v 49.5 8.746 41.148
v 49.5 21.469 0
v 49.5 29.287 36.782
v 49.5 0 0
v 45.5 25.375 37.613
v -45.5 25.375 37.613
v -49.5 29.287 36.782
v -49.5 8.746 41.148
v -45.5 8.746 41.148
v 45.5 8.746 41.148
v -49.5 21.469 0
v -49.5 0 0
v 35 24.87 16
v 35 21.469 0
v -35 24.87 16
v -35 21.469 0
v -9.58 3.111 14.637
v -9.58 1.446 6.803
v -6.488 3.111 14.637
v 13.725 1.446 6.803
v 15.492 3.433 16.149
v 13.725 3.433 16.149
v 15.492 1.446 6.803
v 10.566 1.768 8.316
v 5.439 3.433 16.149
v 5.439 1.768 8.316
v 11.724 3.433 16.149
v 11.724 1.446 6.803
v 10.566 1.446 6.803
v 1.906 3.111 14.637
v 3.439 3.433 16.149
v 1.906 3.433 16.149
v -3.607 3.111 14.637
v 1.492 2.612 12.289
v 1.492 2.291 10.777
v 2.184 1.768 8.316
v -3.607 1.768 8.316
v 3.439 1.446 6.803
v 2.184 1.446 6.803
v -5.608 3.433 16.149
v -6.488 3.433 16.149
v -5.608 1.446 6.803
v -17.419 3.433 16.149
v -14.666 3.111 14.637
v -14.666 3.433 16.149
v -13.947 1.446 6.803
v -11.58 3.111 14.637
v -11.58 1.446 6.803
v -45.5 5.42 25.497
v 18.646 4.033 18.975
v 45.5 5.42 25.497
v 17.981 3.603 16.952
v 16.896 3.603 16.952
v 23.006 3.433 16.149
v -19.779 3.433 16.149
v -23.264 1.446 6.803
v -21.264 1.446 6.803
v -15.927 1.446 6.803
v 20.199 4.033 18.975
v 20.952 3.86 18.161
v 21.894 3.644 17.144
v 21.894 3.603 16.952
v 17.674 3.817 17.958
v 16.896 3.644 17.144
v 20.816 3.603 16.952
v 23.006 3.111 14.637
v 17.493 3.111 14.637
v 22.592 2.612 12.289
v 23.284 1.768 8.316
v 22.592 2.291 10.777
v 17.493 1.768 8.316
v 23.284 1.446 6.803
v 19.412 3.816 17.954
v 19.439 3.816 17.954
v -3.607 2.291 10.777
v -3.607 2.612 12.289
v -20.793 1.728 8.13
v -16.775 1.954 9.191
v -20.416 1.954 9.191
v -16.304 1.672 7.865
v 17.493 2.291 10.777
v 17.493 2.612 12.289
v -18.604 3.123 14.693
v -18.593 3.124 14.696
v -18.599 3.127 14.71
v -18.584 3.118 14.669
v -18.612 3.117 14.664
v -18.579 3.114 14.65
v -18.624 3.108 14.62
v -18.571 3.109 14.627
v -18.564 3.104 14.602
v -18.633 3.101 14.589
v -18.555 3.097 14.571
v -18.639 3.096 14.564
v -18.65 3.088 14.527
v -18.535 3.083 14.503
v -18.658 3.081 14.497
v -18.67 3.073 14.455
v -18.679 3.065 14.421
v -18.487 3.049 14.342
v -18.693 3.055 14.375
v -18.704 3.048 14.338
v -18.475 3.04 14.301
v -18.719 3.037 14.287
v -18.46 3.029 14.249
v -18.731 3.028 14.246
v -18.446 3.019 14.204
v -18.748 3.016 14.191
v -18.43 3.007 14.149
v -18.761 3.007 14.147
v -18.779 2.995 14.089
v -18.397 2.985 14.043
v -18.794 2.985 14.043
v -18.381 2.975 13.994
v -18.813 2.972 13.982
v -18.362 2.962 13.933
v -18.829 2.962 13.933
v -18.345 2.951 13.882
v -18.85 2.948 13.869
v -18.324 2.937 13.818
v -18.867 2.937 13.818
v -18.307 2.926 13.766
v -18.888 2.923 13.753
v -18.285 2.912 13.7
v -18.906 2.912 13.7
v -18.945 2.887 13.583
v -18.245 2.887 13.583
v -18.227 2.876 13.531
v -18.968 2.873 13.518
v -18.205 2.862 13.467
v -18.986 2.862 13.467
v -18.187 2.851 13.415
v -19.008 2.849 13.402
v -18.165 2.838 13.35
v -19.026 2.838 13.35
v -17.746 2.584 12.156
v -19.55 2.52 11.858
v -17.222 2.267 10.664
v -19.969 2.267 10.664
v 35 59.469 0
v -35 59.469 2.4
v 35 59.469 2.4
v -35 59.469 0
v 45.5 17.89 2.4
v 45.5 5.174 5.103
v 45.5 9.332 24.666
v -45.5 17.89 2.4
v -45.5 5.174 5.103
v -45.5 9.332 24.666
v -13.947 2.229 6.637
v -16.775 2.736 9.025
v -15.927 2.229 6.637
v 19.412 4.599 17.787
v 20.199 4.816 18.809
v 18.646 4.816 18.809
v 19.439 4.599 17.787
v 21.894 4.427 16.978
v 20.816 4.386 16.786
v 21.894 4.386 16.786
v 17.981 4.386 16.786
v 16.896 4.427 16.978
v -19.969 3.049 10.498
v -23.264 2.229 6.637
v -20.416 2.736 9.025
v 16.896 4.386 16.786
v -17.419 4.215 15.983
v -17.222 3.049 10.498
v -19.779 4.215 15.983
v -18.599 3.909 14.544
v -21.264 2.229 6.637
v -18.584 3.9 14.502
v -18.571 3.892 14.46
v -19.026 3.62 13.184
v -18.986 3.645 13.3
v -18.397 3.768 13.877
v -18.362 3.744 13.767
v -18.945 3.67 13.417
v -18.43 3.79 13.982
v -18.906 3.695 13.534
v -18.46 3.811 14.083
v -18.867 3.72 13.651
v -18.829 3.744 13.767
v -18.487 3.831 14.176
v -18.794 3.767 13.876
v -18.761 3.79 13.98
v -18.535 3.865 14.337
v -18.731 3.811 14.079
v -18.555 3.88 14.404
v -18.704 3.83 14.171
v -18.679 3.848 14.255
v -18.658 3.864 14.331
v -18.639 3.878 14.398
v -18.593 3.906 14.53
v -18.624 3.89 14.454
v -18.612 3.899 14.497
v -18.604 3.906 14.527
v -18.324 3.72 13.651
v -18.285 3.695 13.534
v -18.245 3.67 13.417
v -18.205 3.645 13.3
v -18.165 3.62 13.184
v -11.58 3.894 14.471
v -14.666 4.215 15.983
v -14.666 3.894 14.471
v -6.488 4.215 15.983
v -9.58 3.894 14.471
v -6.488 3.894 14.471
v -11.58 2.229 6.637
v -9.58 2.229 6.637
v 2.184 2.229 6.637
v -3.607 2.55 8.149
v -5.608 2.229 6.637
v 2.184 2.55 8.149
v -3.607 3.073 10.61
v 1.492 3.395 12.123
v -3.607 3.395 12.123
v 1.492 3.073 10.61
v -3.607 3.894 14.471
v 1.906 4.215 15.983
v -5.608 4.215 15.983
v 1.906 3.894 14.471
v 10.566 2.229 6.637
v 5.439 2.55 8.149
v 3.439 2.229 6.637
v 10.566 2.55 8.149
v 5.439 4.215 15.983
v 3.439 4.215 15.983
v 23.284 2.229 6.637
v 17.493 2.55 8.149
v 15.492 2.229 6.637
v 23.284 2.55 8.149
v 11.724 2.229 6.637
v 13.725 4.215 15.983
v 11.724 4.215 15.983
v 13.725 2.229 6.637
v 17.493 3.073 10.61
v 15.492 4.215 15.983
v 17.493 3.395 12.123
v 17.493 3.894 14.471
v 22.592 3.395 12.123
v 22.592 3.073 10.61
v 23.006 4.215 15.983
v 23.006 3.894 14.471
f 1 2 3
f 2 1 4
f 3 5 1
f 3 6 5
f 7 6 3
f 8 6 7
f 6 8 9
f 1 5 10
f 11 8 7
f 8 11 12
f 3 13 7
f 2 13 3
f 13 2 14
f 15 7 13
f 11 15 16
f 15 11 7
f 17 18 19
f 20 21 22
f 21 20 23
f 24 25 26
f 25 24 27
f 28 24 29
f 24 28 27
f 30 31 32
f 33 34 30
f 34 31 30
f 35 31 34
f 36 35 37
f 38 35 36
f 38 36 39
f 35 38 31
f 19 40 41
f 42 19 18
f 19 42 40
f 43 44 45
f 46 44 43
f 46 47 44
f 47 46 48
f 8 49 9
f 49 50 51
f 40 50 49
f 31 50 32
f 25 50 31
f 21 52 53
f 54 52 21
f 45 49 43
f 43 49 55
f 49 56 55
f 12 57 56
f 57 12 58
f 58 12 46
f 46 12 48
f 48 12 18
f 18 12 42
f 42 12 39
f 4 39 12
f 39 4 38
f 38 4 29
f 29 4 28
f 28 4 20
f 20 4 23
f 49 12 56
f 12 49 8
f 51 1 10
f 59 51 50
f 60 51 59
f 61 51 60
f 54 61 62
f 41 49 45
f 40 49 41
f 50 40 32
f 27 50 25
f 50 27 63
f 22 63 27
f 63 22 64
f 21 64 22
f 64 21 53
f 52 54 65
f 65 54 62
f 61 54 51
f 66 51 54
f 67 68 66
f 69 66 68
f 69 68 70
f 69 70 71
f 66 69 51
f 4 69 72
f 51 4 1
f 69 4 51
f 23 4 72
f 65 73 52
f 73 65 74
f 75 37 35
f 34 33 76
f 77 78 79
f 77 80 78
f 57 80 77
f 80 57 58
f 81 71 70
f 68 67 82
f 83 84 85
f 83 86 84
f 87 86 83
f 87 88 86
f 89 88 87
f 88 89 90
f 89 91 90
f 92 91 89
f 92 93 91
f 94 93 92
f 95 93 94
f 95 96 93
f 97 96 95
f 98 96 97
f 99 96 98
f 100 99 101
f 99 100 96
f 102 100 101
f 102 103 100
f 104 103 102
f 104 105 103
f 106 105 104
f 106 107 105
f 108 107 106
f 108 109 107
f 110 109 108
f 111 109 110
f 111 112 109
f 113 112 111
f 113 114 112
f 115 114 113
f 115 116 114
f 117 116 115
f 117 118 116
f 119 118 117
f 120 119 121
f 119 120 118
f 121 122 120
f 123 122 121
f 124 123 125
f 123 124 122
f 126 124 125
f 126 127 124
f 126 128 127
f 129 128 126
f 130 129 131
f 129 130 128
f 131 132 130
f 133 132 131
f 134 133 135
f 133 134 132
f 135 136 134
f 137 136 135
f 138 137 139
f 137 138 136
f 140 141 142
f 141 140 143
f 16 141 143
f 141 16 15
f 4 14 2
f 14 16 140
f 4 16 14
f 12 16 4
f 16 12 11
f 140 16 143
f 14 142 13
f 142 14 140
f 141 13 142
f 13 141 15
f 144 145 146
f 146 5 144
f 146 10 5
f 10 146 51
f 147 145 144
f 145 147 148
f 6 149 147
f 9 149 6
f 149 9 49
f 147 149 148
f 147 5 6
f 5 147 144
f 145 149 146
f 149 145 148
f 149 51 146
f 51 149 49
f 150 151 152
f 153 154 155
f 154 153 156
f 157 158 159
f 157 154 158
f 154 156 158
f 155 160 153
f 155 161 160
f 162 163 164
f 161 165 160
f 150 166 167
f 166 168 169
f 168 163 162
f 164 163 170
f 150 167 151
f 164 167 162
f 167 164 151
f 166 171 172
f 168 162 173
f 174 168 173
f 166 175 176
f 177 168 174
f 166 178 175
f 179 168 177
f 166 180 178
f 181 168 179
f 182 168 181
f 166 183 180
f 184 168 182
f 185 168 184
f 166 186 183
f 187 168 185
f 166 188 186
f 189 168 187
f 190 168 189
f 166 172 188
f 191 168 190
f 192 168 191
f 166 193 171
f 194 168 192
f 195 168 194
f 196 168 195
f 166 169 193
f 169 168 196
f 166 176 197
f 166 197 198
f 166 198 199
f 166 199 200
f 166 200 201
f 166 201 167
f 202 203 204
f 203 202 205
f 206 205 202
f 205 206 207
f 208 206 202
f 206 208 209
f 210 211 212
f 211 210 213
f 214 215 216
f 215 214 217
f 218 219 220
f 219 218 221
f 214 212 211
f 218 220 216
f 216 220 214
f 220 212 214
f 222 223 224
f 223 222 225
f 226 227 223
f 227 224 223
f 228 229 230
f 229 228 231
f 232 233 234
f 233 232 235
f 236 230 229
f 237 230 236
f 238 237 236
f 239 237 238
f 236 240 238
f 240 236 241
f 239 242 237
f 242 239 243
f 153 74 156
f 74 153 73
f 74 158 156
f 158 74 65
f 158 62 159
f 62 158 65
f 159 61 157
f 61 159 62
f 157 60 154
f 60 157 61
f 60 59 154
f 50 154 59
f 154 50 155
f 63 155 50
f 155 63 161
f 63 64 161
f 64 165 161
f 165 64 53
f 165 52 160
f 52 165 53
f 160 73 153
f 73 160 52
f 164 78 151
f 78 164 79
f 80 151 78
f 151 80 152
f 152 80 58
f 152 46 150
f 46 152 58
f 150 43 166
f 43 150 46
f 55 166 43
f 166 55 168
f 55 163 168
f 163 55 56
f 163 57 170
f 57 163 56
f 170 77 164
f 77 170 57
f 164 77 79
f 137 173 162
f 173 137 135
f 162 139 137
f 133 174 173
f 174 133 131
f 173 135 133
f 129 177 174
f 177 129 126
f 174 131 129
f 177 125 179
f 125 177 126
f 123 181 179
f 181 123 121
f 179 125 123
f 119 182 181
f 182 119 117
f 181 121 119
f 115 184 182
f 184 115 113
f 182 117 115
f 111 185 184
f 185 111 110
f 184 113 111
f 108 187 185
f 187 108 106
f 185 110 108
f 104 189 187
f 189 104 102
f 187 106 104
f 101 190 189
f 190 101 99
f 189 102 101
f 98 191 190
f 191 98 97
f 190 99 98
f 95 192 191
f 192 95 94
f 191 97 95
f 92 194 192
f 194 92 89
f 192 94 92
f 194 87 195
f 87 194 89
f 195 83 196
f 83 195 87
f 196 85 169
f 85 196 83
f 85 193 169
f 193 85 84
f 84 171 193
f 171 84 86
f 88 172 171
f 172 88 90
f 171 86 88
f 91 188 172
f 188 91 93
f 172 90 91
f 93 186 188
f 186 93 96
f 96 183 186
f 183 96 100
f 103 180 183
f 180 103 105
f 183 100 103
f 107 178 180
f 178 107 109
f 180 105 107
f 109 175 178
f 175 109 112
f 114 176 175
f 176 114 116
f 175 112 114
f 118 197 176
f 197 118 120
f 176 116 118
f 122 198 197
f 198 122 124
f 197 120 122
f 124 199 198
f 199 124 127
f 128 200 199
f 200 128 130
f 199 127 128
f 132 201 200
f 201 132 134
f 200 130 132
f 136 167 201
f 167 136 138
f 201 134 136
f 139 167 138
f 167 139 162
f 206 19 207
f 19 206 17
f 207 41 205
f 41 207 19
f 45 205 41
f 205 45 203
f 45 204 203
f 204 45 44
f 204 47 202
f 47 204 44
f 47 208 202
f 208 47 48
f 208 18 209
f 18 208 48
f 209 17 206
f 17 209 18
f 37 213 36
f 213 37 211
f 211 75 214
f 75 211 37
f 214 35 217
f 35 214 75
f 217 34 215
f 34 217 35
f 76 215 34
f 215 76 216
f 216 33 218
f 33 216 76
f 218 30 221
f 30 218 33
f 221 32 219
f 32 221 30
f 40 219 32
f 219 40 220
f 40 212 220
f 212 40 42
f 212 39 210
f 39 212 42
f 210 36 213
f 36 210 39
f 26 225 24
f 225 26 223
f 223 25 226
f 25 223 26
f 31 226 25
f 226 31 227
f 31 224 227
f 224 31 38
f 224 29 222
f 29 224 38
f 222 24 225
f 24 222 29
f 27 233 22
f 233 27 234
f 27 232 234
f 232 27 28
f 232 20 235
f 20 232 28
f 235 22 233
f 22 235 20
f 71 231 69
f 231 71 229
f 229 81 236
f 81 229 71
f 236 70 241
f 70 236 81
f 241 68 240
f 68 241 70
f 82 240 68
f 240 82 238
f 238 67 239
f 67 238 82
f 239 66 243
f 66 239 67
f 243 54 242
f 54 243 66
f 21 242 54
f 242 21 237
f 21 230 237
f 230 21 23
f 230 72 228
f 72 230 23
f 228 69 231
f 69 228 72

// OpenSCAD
// ============================================================
// Porta-cartao de mesa "ATELIE" - OpenSCAD 2021.01
// Sem bibliotecas. Unidades em milimetros.
// Imprime apoiado na base (z = 0), sem suporte.
// ============================================================

// ---------- Numeros (todos aqui) ----------
tilt         = 12;    // inclinacao do encosto para tras, em graus
card_w       = 90;    // largura do cartao
card_h       = 50;    // altura do cartao (so referencia da checagem)
stack_t      = 12;    // espessura da pilha de cartoes
clear_w      = 1.0;   // folga total na largura do bolso
clear_t      = 1.0;   // folga total na espessura do bolso
front_t      = 4;     // parede frontal (onde fica o texto)
back_t       = 4;     // parede traseira (encosto)
side_t       = 4;     // paredes laterais
floor_t      = 2.4;   // espessura minima do piso sob o bolso
min_wall     = 2;     // parede minima exigida
pocket_depth = 36;    // profundidade do bolso ao longo do encosto
window_depth = 20;    // altura da parede frontal baixa (cartao aparece acima)
foot_len     = 38;    // quanto o pe avanca atras do encosto
foot_h       = 16;    // altura onde o pe encontra o encosto
foot_end_t   = 2.4;   // espessura da ponta do pe
foot_w       = 70;    // largura do pe
foot_overlap = 3;     // quanto o pe entra na parede traseira (fusao)
text_str     = "ATELIÊ";                      // texto gravado
text_font    = "Liberation Sans:style=Bold";  // fonte
text_size    = 10;    // altura das letras
engrave      = 0.8;   // profundidade da gravacao

// ---------- Derivados ----------
ca       = cos(tilt);
sa       = sin(tilt);
pocket_w = card_w + clear_w;               // largura interna do bolso
pocket_t = stack_t + clear_t;              // espessura interna do bolso
body_w   = pocket_w + 2 * side_t;          // largura total
body_t   = front_t + pocket_t + back_t;    // espessura da placa inclinada
// piso do bolso: o canto traseiro e o mais baixo (inclinado), fica a floor_t de z=0
floor_u  = (floor_t + (front_t + pocket_t) * sa) / ca;
slab_h   = floor_u + pocket_depth;         // altura da placa ao longo do encosto
u_win    = floor_u + window_depth;         // topo da parede frontal baixa
text_u   = u_win / 2;                      // centro vertical do texto
function y_r(z) = body_t / ca + z * tan(tilt);  // y da face traseira na altura z
y_end    = y_r(0) + foot_len;              // ponta do pe

assert(front_t - engrave >= min_wall, "parede frontal sob a gravacao ficou fina");
assert(back_t >= min_wall && side_t >= min_wall && floor_t >= min_wall && foot_end_t >= min_wall,
       "alguma parede ficou abaixo do minimo");
assert(pocket_depth < card_h, "o cartao precisa sobrar acima do bolso");

// ---------- Modulos ----------
module slab() {
    rotate([-tilt, 0, 0])
        translate([-body_w / 2, 0, 0])
            cube([body_w, body_t, slab_h]);
}

module foot() {
    // perfil (y,z) extrudado ao longo de X
    rotate([90, 0, 90])
        linear_extrude(height = foot_w, center = true)
            polygon([
                [y_r(0) - foot_overlap, 0],
                [y_end, 0],
                [y_end, foot_end_t],
                [y_r(foot_h), foot_h],
                [y_r(foot_h) - foot_overlap, foot_h]
            ]);
}

module pocket() {
    rotate([-tilt, 0, 0]) {
        // bolso dos cartoes, aberto em cima
        translate([-pocket_w / 2, front_t, floor_u])
            cube([pocket_w, pocket_t, slab_h]);
        // rebaixo da parede frontal, deixa o cartao aparecer
        translate([-pocket_w / 2, -1, u_win])
            cube([pocket_w, front_t + 1.01, slab_h]);
    }
}

module engraving() {
    // texto na face frontal, cortando engrave mm para dentro
    rotate([-tilt, 0, 0])
        translate([0, engrave, text_u])
            rotate([90, 0, 0])
                linear_extrude(height = engrave + 1)
                    text(text_str, size = text_size, font = text_font,
                         halign = "center", valign = "center");
}

// ---------- Peca ----------
difference() {
    intersection() {
        union() {
            slab();
            foot();
        }
        // corta tudo abaixo de z = 0 (base plana na mesa)
        translate([-500, -500, 0]) cube([1000, 1000, 500]);
    }
    pocket();
    engraving();
}

// ---------- Dimensoes ----------
echo(largura_mm = body_w);
echo(profundidade_mm = y_end);
echo(altura_mm = slab_h * ca);
